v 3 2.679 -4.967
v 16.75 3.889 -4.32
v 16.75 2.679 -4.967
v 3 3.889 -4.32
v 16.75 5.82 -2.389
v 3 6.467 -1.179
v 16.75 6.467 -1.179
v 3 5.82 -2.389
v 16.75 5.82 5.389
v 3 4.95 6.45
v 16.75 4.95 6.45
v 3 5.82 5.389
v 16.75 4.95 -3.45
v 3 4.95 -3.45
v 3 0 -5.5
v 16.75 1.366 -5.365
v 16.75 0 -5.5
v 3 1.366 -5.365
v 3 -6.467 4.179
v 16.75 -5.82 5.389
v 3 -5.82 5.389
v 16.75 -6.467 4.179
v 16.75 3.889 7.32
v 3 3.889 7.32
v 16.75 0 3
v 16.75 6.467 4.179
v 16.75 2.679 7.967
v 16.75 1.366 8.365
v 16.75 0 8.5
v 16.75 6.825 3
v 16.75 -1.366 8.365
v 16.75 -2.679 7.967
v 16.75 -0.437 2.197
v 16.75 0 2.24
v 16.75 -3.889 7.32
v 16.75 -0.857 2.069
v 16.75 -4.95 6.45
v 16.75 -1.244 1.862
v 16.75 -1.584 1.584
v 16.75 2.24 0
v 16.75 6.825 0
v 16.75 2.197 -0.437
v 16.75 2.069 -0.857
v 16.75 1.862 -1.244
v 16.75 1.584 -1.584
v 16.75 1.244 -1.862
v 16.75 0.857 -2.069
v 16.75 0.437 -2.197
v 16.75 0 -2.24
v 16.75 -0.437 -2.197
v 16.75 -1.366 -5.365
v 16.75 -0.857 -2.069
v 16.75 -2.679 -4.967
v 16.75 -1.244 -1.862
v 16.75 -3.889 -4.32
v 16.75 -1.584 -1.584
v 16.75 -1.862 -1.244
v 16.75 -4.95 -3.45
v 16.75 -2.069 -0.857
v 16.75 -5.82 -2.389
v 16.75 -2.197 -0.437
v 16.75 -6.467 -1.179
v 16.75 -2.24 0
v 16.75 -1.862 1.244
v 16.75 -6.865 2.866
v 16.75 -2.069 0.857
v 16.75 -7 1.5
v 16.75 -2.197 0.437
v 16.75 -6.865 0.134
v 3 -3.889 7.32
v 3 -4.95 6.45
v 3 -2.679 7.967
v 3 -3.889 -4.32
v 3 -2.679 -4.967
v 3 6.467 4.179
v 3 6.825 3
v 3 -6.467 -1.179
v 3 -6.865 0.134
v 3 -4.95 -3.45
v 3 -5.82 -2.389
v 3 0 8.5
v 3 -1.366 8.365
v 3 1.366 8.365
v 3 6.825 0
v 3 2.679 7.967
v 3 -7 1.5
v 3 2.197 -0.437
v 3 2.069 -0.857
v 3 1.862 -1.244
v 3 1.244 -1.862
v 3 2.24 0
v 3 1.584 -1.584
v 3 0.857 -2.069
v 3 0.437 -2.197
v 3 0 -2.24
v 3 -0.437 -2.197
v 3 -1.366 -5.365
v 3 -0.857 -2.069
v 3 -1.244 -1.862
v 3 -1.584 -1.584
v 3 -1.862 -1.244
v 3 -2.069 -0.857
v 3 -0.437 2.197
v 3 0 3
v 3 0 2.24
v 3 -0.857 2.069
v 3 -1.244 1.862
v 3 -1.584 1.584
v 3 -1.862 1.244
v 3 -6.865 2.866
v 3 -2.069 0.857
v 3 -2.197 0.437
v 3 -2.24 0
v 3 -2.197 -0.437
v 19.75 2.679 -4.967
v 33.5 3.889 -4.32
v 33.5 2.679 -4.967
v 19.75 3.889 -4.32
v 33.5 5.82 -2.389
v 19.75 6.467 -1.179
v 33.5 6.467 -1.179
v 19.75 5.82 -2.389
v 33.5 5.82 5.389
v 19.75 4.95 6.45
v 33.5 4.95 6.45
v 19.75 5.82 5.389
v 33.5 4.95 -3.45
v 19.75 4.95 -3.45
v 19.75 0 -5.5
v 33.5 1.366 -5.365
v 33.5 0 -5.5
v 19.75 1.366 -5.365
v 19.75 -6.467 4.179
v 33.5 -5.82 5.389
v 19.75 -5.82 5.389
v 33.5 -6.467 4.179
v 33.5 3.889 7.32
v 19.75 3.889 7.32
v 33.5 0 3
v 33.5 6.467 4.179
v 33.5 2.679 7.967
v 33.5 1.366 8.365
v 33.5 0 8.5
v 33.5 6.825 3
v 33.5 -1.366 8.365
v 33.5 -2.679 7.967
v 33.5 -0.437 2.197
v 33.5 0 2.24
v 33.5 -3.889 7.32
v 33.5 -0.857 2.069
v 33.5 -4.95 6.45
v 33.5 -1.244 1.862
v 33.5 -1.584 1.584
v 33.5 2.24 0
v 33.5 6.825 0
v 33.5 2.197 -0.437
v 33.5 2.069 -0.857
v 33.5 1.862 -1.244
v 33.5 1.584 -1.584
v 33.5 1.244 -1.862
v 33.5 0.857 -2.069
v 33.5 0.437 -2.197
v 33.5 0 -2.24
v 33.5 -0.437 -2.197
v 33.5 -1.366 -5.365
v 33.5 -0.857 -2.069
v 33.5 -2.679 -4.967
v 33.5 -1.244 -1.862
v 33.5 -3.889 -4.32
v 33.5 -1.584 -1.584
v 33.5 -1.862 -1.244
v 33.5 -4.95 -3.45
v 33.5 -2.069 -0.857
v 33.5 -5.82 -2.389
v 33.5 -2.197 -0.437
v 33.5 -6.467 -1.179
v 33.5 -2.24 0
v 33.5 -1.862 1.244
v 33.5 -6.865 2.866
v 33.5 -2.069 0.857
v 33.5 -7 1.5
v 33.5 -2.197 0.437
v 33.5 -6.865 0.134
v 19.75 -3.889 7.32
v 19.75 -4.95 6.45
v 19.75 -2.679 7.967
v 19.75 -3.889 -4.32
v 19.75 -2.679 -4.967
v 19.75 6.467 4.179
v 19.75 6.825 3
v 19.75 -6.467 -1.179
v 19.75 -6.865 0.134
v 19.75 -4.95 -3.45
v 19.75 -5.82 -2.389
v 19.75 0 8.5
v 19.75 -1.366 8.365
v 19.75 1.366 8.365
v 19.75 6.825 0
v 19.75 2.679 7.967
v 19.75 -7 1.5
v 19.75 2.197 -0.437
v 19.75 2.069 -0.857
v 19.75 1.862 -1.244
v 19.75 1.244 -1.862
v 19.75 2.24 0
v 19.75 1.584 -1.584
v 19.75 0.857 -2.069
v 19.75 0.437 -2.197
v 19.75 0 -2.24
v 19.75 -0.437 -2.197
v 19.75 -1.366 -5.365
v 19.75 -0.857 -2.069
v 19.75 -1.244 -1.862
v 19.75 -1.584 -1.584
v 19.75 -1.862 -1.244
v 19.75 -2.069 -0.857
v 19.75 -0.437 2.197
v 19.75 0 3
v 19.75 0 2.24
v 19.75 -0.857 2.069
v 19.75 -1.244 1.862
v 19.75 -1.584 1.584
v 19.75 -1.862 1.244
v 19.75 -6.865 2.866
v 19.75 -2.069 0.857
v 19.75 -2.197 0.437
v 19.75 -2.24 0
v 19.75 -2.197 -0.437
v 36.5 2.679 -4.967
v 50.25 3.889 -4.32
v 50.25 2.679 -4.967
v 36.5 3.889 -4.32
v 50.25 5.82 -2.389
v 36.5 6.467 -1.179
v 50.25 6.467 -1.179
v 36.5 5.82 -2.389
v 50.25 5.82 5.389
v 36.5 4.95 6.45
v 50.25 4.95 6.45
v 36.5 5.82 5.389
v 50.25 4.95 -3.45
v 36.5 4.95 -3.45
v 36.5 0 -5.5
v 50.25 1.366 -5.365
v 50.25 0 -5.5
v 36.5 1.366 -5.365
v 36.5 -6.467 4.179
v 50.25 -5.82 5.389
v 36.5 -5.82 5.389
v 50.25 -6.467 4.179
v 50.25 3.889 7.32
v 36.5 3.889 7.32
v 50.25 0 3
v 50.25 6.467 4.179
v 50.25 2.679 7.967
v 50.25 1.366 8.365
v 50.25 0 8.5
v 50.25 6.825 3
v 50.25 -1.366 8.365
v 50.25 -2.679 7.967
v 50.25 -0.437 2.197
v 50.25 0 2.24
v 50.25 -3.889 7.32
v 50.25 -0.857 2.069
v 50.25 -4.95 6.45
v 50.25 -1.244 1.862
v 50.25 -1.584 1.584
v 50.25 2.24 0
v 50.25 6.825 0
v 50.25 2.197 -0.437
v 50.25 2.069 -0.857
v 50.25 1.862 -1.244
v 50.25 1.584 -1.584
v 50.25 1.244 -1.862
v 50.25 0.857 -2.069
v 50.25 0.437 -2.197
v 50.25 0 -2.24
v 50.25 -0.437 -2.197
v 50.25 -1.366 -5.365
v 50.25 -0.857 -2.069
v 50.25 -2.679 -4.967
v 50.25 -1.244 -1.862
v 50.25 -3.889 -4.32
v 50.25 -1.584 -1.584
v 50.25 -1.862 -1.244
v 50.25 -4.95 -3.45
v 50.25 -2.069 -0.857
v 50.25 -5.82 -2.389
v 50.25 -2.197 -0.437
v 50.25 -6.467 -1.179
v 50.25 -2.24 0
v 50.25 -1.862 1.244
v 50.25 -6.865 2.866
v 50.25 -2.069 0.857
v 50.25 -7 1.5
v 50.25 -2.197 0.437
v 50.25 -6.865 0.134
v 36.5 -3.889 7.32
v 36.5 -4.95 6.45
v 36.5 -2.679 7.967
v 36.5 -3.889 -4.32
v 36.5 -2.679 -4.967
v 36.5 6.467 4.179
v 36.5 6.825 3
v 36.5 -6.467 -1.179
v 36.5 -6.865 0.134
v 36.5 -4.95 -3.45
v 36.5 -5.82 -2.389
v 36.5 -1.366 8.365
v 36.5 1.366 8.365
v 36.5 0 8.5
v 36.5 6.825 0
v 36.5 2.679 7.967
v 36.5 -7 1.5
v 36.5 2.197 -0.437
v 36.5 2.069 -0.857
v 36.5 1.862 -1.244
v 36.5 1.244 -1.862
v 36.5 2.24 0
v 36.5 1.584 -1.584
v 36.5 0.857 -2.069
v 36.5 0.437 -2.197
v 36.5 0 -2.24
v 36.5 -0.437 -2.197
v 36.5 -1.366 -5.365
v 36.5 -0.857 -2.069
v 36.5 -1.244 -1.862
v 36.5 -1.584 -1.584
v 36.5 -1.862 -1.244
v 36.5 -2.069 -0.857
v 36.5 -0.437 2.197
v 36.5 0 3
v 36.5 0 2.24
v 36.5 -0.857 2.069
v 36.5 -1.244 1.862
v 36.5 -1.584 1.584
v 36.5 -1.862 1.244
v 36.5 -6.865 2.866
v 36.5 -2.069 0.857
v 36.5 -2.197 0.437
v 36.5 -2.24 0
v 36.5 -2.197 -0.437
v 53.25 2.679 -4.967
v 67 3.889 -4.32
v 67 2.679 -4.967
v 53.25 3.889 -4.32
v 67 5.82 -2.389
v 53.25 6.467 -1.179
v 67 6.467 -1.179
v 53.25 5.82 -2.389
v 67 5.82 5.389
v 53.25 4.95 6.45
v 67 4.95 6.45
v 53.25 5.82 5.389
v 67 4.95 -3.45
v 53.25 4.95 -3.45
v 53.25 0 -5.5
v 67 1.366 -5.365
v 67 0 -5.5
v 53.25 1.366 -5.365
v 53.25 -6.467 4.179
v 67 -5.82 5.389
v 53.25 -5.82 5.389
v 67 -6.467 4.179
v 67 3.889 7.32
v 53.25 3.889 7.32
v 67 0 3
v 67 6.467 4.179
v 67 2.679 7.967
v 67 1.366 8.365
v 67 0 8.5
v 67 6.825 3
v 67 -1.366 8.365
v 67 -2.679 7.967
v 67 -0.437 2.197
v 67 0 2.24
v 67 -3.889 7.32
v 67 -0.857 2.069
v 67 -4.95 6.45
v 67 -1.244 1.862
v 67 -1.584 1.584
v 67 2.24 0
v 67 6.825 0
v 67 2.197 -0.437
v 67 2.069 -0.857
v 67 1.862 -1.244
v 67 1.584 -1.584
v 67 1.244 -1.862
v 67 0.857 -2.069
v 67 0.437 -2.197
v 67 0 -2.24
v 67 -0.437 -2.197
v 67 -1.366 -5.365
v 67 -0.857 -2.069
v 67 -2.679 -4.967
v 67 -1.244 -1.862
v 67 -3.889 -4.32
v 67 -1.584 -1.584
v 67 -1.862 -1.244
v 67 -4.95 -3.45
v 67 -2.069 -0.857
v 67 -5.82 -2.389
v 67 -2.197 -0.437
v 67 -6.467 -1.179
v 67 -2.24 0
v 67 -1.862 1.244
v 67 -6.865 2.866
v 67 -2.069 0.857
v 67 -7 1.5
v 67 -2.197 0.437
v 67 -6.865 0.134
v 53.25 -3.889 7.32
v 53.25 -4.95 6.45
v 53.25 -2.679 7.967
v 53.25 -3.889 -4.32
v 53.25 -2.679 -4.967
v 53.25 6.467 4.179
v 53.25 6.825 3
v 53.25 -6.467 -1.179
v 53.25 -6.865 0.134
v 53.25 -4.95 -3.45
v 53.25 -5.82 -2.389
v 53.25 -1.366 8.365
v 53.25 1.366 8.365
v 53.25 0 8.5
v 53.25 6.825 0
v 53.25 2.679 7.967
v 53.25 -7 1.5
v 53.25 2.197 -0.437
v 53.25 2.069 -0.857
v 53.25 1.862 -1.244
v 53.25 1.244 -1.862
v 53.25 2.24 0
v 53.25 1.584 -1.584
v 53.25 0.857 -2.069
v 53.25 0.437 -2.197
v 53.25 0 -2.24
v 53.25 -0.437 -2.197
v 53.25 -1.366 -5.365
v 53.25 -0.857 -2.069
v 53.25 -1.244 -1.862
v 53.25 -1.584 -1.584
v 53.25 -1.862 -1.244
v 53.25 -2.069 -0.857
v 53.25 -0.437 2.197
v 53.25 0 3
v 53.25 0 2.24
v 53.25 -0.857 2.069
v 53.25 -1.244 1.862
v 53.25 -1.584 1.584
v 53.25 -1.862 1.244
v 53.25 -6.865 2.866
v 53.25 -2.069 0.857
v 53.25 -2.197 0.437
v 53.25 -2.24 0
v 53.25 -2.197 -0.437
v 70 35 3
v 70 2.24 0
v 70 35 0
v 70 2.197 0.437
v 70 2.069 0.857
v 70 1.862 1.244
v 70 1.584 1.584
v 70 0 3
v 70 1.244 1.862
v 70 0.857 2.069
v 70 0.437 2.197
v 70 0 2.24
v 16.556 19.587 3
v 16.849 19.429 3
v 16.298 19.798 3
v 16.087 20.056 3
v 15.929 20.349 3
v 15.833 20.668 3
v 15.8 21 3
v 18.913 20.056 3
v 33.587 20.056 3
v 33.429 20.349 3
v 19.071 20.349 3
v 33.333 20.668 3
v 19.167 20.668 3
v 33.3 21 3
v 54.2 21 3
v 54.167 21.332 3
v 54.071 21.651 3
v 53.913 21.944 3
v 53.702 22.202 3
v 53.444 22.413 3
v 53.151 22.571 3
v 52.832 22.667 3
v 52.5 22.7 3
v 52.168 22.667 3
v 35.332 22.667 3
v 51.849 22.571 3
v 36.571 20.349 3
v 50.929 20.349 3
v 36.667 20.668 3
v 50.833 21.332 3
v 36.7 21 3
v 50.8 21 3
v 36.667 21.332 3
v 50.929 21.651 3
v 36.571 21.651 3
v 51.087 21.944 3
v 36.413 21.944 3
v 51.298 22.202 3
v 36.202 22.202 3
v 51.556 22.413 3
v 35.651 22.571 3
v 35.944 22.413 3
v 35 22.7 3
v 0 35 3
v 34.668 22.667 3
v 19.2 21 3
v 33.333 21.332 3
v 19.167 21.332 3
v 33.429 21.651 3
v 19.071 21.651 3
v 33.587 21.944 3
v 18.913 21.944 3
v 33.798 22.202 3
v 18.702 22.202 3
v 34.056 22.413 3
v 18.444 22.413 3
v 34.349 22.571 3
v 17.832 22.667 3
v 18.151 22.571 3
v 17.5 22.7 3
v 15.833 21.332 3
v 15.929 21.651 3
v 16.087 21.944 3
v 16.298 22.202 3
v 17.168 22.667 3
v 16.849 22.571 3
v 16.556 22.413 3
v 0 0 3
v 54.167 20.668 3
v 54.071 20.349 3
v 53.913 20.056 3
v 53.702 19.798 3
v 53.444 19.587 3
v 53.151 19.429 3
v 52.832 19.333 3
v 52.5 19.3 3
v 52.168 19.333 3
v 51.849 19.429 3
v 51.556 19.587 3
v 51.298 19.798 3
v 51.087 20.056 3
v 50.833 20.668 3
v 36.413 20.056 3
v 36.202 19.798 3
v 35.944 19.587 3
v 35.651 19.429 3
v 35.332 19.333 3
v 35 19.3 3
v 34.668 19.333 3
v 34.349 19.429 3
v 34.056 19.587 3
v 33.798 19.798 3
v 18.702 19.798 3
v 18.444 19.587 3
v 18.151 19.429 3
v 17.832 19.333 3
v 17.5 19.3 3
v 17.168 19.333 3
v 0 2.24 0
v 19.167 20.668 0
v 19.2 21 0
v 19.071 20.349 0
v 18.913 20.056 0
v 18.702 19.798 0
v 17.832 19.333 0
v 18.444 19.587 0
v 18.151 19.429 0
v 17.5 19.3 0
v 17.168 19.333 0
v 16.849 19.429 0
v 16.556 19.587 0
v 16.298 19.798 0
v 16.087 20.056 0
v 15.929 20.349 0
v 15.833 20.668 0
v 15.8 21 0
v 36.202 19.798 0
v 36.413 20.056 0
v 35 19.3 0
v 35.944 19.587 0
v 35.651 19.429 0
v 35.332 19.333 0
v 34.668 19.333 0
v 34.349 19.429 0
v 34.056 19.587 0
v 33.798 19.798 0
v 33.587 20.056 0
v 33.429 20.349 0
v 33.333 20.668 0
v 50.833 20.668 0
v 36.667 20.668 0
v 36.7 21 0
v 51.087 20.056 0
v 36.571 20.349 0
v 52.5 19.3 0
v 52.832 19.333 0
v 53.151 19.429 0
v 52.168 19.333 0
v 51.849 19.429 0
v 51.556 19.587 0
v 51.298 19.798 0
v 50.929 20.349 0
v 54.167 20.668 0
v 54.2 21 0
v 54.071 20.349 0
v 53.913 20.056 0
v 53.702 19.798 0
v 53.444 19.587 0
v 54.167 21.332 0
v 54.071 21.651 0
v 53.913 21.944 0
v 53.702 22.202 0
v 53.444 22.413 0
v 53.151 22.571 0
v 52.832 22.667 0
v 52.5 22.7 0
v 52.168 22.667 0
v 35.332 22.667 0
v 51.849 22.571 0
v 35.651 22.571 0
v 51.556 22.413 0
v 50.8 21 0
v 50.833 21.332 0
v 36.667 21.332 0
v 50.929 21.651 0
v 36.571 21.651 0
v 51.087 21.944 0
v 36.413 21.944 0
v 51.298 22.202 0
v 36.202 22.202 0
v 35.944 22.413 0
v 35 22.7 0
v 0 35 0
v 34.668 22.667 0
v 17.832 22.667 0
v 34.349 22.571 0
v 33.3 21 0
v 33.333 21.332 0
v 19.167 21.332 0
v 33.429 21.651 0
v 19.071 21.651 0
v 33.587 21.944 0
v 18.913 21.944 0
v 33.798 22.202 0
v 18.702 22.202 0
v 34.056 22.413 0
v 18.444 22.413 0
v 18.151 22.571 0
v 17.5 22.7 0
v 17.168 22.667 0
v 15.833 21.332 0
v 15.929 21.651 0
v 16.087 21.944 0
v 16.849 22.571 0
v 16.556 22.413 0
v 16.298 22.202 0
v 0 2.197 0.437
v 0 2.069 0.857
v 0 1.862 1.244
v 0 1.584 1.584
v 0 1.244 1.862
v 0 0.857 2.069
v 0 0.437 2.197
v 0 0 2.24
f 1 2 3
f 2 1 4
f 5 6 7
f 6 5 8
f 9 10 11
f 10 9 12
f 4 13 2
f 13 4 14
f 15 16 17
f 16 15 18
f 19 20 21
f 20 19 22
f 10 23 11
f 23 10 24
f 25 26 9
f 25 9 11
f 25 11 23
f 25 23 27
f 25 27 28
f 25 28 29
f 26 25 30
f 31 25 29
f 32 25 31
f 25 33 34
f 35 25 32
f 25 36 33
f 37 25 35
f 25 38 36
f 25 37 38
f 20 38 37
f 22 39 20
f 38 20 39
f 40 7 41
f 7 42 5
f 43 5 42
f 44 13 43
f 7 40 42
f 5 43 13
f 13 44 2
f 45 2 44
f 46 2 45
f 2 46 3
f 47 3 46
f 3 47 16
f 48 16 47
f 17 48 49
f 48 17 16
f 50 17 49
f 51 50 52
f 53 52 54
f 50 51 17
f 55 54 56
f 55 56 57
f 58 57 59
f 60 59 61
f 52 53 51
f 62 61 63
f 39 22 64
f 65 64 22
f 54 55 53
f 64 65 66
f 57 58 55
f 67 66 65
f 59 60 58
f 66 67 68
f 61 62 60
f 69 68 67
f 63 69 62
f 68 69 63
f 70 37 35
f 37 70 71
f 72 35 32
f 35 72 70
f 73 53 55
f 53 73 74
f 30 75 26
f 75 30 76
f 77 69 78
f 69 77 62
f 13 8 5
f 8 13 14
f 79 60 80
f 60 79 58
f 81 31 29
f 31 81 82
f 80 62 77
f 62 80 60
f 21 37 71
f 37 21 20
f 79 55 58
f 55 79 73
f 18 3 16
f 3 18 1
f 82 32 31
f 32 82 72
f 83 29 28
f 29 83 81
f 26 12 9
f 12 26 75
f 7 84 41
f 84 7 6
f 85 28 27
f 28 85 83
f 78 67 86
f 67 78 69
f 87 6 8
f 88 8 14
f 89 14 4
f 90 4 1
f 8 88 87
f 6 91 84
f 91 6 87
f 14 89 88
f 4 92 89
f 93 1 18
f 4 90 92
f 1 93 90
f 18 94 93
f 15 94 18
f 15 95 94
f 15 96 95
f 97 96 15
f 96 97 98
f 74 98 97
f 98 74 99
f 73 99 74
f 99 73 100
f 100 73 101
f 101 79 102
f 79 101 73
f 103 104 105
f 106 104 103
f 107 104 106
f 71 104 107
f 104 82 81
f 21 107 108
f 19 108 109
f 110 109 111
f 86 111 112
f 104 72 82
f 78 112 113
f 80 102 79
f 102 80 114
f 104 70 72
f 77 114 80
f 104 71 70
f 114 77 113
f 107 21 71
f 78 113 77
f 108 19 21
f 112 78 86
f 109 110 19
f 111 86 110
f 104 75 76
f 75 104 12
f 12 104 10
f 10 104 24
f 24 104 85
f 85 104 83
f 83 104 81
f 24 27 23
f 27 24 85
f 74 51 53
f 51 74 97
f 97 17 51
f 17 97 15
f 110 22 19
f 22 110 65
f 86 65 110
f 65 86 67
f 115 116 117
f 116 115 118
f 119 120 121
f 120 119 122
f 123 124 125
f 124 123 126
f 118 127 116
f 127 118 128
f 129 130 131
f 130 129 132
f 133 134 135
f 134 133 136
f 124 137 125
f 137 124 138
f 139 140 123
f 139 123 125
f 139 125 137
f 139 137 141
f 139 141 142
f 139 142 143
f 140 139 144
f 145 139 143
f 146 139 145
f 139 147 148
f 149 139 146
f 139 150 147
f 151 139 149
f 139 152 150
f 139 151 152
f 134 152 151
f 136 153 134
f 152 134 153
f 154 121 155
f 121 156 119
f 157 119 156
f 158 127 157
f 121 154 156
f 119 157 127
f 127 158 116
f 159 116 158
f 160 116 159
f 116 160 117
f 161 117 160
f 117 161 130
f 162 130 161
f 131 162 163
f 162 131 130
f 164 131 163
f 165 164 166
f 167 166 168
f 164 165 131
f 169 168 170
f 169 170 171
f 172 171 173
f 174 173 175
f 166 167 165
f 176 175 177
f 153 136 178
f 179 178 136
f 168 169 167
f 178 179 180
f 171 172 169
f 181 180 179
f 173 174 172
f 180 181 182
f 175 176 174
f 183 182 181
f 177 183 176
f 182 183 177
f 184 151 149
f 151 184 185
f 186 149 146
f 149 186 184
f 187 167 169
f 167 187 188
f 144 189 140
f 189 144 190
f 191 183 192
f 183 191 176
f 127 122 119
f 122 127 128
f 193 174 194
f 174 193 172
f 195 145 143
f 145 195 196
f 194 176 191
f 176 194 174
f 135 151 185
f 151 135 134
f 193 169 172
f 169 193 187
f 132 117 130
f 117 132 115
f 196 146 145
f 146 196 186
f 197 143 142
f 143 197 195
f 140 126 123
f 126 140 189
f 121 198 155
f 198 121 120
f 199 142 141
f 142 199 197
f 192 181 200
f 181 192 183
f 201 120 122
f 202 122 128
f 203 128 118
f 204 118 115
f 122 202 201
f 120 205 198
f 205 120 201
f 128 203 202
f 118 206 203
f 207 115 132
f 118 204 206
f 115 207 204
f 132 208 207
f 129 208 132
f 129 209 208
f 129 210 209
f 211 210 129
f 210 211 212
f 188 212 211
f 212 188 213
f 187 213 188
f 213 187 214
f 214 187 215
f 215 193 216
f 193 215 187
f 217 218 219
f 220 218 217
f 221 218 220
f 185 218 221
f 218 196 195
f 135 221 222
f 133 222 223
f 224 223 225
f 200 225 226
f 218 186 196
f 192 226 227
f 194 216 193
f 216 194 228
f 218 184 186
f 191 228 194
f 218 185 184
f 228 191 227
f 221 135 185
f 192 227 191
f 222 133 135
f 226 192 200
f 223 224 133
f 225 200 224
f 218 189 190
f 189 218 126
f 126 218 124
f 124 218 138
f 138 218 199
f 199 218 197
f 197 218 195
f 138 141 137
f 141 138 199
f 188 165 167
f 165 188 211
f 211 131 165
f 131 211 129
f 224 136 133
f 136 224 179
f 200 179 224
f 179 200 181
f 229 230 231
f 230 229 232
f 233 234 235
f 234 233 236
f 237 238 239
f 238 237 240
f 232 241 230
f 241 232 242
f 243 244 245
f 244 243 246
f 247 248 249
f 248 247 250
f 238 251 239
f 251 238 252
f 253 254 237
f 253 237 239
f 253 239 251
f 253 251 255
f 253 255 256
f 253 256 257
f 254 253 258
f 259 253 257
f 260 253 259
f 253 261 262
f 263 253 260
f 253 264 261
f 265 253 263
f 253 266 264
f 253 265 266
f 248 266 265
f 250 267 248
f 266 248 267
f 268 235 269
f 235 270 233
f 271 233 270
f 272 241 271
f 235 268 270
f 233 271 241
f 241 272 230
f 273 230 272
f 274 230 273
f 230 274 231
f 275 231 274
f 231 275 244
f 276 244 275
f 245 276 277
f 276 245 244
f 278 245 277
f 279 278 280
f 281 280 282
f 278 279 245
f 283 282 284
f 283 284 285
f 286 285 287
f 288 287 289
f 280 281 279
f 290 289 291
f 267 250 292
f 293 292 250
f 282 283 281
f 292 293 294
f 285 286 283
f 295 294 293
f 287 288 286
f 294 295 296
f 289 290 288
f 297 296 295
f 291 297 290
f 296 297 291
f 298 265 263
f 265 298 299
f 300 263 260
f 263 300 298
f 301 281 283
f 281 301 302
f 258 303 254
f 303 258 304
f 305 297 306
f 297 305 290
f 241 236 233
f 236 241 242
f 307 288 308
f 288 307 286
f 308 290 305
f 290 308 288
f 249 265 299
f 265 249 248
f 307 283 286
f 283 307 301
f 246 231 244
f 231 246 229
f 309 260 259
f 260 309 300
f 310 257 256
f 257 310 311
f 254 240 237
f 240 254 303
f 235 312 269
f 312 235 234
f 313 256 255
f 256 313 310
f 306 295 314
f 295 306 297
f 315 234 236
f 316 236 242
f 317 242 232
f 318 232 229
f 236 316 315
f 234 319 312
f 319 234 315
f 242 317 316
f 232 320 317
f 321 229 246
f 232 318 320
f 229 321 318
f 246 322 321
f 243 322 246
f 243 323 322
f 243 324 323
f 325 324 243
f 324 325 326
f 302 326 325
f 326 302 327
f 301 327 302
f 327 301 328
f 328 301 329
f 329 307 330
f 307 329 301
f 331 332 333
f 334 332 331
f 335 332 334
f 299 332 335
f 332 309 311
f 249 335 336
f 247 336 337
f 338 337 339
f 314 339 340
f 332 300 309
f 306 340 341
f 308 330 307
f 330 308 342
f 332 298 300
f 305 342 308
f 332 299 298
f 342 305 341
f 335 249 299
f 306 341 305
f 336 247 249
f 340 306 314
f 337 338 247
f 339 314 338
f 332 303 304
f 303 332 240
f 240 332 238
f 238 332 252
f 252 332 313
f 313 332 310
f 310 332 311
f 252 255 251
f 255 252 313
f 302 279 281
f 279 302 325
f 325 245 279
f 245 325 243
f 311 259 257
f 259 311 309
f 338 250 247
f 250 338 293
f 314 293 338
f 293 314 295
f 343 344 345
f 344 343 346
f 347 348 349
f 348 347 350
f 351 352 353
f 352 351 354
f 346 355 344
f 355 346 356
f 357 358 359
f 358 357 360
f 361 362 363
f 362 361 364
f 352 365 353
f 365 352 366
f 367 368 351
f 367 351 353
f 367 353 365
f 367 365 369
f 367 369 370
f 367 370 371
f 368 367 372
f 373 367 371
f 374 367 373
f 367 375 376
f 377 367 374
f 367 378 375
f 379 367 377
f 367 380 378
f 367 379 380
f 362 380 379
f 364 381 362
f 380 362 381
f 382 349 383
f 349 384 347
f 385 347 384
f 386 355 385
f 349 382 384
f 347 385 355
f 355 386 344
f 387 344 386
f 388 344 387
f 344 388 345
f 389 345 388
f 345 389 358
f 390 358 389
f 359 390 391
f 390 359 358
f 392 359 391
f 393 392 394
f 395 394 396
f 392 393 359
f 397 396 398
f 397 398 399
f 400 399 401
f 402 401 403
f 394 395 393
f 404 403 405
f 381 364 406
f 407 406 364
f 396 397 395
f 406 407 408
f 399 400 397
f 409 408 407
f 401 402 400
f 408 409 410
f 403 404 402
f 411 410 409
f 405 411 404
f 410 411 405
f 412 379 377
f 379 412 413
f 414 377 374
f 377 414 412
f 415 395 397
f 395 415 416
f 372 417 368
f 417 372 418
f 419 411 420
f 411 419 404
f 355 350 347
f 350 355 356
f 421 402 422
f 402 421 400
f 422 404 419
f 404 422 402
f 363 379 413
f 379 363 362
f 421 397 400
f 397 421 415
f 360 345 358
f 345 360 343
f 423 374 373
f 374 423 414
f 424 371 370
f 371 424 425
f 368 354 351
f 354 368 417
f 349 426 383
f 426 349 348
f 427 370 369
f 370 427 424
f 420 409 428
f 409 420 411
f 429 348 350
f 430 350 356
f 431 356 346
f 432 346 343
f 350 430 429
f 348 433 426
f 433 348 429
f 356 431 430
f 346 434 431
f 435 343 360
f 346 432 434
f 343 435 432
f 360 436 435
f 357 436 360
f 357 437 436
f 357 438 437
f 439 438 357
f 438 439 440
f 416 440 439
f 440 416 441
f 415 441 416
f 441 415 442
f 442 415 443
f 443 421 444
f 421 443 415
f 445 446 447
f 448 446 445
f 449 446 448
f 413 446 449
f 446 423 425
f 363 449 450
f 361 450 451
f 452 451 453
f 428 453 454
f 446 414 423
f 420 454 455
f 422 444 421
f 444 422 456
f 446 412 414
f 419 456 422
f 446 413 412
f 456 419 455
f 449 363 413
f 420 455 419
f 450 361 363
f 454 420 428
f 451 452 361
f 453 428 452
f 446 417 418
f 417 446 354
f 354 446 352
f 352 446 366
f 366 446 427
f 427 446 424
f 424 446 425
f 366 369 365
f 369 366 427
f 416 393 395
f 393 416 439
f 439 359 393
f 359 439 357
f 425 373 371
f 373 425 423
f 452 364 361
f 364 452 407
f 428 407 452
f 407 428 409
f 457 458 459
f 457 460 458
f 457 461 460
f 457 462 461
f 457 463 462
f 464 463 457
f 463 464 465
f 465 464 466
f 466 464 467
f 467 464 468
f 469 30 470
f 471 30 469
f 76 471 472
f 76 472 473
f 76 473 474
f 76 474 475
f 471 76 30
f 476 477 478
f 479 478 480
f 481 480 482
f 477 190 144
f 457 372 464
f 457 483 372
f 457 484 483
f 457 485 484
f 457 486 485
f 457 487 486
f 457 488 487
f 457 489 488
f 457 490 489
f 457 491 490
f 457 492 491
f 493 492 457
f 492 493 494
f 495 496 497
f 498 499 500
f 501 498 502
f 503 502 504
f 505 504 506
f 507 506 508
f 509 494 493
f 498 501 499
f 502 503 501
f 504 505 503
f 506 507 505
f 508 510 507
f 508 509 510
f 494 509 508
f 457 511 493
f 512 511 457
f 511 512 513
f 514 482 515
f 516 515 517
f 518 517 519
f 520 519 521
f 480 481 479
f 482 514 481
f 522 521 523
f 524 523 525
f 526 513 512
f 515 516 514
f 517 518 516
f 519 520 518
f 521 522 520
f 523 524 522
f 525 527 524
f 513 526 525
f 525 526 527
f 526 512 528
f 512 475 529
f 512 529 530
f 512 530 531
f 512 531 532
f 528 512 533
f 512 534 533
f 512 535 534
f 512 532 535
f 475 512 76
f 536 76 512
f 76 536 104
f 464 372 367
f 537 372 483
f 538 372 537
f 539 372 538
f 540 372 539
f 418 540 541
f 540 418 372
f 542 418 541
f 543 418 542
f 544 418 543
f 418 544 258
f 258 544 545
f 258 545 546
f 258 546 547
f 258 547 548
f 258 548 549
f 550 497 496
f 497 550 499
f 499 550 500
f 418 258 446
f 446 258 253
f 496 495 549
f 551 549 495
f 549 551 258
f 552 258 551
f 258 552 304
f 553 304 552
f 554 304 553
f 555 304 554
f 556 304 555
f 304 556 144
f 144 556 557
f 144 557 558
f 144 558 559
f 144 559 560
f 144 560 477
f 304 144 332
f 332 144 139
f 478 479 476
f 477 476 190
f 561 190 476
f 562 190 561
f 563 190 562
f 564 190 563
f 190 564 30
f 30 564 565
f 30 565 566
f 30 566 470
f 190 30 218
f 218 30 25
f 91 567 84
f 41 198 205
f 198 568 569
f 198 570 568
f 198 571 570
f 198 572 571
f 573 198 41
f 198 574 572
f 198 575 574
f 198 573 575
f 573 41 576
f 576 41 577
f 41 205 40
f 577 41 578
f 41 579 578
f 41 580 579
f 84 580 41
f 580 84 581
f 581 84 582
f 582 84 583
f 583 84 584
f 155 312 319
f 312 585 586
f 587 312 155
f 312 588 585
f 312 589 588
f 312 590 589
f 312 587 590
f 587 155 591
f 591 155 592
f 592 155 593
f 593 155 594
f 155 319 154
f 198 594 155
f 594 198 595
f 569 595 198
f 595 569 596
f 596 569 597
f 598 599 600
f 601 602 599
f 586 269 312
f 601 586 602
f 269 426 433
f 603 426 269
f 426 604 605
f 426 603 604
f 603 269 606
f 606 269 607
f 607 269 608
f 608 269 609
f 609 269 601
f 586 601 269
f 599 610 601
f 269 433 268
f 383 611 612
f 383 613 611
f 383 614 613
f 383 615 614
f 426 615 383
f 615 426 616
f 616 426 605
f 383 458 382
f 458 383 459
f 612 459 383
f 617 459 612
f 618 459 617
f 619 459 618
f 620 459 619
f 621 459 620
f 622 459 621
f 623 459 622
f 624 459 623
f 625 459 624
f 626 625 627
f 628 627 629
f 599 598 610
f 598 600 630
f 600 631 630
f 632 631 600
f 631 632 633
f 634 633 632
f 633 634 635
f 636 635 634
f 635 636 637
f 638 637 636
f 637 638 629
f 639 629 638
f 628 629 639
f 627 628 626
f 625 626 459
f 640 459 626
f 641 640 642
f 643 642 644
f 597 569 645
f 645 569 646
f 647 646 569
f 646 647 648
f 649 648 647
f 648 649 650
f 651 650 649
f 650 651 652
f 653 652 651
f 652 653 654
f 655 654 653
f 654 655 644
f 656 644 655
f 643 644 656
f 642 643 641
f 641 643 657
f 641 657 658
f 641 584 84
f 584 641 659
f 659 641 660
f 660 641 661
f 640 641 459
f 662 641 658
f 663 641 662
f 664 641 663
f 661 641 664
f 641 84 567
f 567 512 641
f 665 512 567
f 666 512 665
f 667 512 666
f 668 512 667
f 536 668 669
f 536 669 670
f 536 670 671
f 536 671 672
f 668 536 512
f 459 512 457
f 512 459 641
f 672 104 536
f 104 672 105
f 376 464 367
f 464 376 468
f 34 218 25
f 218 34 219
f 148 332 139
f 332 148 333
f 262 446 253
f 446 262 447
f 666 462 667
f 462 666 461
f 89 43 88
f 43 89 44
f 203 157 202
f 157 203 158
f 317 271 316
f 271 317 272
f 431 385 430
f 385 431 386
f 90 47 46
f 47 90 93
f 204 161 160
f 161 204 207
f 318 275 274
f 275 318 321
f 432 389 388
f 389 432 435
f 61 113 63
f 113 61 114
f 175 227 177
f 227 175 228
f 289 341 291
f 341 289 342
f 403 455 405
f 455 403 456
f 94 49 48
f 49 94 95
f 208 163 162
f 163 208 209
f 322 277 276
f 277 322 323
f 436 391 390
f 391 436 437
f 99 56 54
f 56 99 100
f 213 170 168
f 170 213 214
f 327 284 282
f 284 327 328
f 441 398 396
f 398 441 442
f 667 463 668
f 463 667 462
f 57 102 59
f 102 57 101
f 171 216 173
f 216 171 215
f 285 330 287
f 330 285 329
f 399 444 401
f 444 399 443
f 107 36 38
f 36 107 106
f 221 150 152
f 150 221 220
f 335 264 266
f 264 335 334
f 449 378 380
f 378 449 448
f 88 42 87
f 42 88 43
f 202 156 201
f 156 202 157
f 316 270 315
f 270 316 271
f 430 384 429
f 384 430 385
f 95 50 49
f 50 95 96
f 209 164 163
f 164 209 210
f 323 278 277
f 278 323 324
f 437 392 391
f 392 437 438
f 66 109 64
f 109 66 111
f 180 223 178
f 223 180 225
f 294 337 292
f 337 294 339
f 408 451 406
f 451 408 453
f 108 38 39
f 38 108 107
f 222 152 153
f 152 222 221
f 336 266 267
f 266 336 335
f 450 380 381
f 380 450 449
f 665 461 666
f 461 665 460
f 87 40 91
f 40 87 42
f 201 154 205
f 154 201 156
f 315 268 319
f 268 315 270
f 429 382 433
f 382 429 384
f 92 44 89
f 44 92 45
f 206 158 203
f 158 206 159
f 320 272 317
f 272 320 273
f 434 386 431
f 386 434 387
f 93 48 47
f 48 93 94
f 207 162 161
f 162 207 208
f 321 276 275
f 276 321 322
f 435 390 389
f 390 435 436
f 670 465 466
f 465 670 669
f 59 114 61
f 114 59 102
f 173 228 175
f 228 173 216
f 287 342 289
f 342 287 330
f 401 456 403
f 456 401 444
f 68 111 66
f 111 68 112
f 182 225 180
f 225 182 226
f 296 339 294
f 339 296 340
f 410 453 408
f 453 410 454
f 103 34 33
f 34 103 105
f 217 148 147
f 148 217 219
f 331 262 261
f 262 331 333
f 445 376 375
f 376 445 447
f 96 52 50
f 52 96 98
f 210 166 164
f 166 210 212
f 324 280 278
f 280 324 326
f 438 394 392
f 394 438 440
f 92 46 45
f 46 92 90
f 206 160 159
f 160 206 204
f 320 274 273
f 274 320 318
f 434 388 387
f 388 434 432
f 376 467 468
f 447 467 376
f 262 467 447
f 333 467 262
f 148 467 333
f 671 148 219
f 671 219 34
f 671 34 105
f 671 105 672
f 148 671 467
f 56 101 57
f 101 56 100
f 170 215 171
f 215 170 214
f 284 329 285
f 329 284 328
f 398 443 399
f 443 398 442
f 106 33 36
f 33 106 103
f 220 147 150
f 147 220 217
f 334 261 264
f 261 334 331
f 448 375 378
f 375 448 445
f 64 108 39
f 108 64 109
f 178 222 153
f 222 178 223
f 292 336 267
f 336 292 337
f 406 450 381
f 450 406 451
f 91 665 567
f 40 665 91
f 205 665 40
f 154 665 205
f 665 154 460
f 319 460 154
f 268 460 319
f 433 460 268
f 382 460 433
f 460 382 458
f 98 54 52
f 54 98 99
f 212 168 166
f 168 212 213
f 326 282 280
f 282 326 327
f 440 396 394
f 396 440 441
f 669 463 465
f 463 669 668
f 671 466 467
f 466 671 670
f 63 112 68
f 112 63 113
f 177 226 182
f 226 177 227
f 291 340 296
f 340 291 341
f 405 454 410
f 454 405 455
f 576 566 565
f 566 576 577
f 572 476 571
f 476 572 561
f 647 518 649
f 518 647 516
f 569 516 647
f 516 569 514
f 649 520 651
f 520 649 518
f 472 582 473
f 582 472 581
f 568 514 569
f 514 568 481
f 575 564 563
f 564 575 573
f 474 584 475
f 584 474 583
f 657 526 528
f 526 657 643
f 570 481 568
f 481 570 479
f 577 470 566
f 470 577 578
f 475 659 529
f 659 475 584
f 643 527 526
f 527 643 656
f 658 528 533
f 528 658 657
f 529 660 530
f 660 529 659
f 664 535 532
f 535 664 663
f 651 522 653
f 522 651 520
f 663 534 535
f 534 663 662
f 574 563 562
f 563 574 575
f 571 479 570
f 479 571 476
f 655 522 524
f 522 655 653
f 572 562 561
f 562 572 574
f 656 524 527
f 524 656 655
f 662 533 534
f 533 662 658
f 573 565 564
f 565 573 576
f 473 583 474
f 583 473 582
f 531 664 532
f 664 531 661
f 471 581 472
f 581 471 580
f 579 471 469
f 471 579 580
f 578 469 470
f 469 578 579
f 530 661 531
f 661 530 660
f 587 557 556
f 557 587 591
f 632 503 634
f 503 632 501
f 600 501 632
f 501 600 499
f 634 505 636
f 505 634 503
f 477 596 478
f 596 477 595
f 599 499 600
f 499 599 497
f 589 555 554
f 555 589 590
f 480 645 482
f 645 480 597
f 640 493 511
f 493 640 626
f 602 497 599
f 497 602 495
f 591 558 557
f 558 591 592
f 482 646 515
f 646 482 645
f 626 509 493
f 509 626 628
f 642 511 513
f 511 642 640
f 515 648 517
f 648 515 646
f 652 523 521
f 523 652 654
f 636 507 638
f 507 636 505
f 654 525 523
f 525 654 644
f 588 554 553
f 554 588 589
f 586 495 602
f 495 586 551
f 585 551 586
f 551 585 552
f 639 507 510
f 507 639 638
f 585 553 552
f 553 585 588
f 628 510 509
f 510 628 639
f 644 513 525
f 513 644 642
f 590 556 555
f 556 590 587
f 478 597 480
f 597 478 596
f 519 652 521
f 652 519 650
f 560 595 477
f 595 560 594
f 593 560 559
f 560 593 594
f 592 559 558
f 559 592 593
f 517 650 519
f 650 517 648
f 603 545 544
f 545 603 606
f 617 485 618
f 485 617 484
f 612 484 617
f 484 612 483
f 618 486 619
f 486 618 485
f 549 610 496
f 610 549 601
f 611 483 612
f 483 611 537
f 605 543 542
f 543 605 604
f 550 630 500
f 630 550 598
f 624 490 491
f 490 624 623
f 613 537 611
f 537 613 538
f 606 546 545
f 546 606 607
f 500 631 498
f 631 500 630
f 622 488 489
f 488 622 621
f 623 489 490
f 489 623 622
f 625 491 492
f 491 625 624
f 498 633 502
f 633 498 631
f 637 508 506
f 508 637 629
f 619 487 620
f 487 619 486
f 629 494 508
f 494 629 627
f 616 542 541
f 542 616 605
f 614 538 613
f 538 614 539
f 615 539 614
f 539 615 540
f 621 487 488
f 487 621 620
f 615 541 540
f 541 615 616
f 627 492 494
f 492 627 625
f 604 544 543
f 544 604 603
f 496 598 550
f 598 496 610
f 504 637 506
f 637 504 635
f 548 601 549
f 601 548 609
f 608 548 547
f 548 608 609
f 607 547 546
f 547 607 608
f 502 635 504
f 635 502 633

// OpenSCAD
$fn = 32;

// ----------------------------------------------------------------------
// Hinge leaf: 70 x 42 x 14 mm
// ----------------------------------------------------------------------

// --- parameters (mm) ---
plate_len = 70;           // leaf length, X
plate_w = 35;             // leaf width, Y
plate_t = 3;              // leaf thickness
barrel_d = 14;            // knuckle diameter
barrel_w = 13.75;         // knuckle width
knuckle_n = 4;            // number of knuckles
pin_d = 4.48;             // pin bore
gap = 3;                  // gap between the knuckles
screw_d = 3.4;            // screw clearance

module leaf() {
  cube([plate_len, plate_w, plate_t]);
}

module knuckles() {
  /* barrels sit on the leaf edge, the pin axis at half the leaf thickness */
  for (i = [0 : knuckle_n - 1])
    translate([gap + i * (barrel_w + gap), 0, plate_t * 0.5])
      rotate([0, 90, 0]) cylinder(h = barrel_w, d = barrel_d);
}

difference() {
  union() {
    leaf();
    knuckles();
  }
  rotate([0, 90, 0]) translate([0, 0, -1])
    cylinder(h = plate_len + 2, d = pin_d);
  translate([17.5, plate_w * 0.6, -1]) cylinder(h = plate_t + 2, d = screw_d);
  translate([35, plate_w * 0.6, -1]) cylinder(h = plate_t + 2, d = screw_d);
  translate([52.5, plate_w * 0.6, -1]) cylinder(h = plate_t + 2, d = screw_d);
}
